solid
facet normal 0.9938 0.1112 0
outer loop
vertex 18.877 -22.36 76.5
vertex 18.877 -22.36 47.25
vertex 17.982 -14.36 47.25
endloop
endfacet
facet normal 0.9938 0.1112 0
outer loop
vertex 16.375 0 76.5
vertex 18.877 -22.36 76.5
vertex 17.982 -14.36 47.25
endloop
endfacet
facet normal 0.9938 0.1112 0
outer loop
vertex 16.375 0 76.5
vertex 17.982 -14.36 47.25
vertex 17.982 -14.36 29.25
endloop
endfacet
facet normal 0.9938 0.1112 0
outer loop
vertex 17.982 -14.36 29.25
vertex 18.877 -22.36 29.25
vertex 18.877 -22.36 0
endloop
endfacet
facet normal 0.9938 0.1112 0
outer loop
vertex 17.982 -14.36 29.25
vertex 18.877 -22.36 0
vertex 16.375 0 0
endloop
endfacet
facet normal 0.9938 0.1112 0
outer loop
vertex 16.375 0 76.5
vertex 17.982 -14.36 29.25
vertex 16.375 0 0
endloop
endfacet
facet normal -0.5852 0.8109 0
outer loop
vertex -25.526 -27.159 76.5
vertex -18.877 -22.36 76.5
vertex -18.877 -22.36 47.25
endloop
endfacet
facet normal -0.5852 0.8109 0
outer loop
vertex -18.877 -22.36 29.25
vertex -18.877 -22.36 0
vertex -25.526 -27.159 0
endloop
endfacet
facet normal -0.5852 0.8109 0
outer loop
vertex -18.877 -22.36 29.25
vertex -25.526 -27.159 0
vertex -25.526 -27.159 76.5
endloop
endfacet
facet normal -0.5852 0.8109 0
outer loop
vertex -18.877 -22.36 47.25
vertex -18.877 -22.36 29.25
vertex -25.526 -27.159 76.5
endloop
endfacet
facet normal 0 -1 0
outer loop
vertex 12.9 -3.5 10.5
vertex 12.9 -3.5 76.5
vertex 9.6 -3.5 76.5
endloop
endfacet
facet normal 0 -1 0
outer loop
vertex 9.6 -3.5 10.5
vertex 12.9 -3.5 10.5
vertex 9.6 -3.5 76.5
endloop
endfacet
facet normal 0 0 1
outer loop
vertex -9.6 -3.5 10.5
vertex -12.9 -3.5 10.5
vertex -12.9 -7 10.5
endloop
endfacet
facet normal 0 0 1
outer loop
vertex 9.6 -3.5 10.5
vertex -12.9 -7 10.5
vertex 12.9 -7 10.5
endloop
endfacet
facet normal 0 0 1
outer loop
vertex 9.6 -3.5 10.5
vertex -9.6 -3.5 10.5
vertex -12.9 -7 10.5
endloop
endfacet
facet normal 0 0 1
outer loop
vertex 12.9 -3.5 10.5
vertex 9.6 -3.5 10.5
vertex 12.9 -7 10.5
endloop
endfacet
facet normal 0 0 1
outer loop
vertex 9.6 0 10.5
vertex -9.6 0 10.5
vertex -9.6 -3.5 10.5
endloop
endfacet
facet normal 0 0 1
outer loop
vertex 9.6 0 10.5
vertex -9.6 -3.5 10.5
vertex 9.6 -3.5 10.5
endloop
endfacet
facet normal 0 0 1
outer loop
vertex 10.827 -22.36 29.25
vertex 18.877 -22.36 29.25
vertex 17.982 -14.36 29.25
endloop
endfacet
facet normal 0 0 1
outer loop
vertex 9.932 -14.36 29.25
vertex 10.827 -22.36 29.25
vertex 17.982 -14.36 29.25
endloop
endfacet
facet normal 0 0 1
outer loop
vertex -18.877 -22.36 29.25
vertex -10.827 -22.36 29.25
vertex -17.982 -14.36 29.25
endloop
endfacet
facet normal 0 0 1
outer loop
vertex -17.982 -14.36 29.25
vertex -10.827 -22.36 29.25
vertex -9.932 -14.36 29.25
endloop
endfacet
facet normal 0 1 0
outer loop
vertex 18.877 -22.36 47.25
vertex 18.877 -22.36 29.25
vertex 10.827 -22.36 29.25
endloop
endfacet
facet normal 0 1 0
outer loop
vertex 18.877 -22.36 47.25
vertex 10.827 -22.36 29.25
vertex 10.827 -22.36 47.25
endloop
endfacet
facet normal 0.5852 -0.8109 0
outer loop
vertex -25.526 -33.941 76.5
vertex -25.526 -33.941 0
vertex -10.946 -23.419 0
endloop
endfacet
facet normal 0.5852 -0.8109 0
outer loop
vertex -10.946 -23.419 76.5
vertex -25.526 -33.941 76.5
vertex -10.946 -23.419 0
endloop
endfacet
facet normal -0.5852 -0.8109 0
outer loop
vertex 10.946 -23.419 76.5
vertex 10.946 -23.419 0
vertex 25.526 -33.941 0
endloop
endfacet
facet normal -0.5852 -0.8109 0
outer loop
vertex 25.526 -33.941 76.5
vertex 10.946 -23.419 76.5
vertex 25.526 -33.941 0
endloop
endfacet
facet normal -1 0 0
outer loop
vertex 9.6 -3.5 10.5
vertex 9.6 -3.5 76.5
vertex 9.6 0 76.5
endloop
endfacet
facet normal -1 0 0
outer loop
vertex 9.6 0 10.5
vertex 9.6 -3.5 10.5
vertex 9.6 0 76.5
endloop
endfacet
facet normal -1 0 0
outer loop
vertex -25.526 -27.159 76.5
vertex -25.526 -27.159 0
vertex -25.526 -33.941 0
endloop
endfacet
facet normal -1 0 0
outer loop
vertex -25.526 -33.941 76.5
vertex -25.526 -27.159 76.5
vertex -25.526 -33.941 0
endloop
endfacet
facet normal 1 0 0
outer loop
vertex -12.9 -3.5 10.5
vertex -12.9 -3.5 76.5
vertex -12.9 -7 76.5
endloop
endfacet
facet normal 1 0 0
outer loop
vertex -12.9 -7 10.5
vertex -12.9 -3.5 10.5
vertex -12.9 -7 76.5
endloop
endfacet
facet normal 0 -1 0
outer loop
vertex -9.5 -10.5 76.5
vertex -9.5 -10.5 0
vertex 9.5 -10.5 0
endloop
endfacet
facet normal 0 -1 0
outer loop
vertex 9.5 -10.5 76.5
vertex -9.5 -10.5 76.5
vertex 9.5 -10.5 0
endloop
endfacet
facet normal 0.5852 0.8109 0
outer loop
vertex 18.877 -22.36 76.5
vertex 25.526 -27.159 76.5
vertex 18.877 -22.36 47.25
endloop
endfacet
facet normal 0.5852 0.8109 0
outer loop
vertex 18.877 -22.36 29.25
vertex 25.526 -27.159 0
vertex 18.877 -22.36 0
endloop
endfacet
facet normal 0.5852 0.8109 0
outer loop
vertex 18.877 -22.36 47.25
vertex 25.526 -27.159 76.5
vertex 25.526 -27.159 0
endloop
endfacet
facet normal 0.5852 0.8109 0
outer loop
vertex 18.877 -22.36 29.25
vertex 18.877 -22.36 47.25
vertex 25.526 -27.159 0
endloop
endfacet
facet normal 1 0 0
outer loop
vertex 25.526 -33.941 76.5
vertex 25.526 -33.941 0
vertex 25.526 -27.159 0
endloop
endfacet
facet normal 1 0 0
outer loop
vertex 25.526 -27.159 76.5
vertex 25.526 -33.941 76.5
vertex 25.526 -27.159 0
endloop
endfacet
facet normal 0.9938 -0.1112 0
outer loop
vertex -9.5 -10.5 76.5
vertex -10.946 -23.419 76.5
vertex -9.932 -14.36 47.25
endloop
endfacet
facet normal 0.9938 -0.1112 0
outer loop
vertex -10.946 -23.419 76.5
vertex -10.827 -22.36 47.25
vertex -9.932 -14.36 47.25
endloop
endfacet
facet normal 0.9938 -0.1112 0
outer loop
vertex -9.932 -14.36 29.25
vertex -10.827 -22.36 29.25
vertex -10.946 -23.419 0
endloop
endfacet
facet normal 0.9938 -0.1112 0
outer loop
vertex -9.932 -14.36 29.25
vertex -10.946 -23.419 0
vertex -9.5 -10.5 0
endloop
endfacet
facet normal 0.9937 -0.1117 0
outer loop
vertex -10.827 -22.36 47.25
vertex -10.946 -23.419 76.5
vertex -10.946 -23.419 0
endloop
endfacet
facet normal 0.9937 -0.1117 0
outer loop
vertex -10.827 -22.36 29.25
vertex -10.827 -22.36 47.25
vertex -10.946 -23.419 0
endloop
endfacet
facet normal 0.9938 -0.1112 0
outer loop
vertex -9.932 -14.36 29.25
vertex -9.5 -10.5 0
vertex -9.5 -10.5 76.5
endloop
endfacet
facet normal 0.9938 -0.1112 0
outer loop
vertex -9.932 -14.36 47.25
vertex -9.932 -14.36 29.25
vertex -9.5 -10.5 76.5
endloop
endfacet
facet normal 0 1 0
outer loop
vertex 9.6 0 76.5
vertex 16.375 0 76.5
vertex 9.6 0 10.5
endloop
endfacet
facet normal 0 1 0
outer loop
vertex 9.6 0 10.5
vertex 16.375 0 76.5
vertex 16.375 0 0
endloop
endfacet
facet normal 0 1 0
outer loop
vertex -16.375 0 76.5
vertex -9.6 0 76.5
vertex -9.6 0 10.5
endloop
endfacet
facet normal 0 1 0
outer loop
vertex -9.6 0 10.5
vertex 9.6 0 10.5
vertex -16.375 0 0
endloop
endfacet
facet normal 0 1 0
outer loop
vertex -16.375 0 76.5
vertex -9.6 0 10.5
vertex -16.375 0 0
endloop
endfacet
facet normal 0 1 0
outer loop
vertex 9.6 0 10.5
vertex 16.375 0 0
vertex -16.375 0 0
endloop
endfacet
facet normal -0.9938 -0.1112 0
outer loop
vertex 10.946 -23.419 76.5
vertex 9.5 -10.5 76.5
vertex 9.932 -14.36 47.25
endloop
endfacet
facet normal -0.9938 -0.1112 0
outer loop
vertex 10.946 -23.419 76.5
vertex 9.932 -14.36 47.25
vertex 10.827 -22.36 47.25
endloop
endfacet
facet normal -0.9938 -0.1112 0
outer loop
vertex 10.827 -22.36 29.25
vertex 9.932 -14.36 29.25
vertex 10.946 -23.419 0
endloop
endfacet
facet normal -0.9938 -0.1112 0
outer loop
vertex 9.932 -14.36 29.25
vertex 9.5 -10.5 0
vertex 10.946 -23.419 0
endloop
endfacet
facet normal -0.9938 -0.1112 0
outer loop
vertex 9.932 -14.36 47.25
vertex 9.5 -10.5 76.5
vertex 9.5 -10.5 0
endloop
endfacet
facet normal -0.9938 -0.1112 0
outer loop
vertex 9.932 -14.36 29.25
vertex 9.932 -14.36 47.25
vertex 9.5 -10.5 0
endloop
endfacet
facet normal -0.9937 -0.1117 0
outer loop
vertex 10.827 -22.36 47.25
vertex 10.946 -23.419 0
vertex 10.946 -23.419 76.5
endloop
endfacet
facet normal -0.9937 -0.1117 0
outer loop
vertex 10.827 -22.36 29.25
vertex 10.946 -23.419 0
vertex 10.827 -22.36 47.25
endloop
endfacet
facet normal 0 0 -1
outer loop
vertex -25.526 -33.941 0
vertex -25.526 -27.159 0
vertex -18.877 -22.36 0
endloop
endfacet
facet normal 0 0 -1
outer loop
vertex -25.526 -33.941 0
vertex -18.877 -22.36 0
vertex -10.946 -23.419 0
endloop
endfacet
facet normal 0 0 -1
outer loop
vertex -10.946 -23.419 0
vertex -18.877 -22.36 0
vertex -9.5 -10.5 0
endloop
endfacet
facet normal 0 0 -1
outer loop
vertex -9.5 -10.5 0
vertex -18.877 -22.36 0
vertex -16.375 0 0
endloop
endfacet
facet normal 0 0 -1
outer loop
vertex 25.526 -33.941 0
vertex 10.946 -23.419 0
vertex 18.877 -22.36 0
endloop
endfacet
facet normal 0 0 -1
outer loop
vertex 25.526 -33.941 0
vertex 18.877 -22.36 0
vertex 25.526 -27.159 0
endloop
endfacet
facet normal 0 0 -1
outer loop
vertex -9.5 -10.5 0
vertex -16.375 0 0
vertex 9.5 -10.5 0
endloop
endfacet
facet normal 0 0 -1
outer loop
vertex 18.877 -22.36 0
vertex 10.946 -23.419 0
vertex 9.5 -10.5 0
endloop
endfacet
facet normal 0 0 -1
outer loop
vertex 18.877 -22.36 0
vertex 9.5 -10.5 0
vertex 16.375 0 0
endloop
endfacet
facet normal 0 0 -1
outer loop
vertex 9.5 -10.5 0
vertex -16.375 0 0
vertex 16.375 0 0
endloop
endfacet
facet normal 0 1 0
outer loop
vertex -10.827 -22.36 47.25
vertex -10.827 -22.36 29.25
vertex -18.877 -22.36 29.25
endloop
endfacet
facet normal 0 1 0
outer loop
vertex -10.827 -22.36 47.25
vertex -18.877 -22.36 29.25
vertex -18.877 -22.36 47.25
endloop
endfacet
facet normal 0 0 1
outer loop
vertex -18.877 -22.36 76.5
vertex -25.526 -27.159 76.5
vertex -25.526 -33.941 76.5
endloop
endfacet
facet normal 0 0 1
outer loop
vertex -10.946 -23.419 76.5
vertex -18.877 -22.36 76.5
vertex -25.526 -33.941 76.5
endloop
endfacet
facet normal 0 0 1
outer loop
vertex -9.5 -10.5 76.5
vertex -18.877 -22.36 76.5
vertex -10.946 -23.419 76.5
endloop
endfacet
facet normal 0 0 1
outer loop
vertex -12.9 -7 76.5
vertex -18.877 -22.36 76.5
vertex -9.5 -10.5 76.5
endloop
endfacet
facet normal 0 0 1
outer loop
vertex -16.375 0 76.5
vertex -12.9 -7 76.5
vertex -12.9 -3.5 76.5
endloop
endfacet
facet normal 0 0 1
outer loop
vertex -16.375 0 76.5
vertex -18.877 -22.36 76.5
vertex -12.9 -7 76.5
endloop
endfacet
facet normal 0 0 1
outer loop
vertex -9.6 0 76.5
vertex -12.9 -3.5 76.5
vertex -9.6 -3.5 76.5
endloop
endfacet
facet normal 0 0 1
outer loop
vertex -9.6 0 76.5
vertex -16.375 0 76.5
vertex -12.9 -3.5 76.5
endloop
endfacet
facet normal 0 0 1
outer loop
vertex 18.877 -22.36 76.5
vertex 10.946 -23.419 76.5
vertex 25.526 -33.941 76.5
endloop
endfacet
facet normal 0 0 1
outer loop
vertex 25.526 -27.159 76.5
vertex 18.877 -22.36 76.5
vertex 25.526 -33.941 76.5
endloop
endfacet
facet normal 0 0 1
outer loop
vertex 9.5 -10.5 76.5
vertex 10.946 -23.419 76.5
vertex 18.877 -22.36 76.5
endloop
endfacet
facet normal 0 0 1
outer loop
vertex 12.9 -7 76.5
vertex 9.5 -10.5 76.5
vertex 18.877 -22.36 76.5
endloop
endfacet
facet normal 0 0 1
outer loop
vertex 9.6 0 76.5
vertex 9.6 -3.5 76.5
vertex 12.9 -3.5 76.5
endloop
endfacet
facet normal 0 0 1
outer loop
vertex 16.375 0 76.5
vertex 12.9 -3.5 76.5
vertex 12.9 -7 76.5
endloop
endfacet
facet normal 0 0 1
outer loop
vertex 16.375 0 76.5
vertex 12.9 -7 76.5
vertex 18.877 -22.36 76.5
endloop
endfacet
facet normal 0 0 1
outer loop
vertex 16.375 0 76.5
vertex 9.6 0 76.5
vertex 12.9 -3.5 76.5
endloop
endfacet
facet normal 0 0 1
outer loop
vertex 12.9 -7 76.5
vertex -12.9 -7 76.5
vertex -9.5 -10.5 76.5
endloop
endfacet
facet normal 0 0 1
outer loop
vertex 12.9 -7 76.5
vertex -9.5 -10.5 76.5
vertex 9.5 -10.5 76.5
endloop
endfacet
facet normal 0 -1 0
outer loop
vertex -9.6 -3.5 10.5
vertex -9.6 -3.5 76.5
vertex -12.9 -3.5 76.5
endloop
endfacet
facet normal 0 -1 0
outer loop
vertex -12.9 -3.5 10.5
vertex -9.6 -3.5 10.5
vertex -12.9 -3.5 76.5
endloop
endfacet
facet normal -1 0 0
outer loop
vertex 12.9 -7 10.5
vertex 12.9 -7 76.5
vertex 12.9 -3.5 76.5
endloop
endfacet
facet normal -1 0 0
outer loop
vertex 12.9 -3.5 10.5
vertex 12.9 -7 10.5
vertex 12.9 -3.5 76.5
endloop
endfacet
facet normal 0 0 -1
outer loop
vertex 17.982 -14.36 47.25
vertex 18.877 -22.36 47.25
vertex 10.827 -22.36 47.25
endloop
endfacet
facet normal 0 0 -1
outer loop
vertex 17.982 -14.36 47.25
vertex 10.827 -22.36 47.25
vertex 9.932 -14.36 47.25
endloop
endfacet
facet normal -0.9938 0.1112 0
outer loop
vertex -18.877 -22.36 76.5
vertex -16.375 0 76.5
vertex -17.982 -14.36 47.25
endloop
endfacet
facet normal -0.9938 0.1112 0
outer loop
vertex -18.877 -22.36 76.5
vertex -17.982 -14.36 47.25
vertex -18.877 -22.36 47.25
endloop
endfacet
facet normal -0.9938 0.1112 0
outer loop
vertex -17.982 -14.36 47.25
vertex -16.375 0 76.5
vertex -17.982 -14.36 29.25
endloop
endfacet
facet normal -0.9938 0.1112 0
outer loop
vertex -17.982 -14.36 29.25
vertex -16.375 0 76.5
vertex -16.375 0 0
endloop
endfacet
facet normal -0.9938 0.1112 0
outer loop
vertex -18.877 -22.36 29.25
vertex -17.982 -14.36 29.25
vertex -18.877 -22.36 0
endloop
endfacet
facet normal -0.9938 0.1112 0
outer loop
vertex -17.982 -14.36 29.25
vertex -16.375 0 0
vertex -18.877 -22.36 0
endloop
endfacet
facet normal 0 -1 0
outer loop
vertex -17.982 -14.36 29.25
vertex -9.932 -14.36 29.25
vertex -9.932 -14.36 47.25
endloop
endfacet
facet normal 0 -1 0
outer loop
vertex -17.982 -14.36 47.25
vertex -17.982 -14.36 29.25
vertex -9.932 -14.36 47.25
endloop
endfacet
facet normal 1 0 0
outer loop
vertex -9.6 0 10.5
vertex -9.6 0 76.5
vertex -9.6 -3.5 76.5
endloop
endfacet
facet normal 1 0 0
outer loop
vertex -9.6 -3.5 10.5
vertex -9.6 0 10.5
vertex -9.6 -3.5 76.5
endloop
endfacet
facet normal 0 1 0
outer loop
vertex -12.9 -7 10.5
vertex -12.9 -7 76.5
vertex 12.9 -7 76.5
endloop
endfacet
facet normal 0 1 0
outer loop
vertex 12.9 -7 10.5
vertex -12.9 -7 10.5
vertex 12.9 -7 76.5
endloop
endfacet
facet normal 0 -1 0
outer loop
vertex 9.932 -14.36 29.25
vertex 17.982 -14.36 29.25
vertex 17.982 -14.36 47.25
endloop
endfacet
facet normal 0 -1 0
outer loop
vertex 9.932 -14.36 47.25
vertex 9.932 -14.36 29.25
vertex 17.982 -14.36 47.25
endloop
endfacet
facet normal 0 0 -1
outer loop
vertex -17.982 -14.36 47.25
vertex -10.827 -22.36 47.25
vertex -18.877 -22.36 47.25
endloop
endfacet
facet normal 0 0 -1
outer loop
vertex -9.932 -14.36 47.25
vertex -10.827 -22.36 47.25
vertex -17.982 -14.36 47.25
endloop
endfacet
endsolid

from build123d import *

# Parameters (mm, degrees)
F1_DEPTH = 76.5
F3_DEPTH = 66
F5_W     = 8
F5_H     = 18
F6_DEPTH = 44.4045879922


with BuildPart() as f1:
    # F0 (on Top) → F1 (new body)
    with BuildSketch(Plane.XY):
        Polygon((18.8770888389, -22.3604461369), (16.375, 0), (0, 0), (-16.375, 0), (-18.8770888389, -22.3604461369), (-25.5264991533, -27.1589190681), (-25.5264991533, -33.9414753953), (-10.9456513292, -23.4193688791), (-9.5, -10.5), (0, -10.5), (9.5, -10.5), (10.9456513292, -23.4193688791), (25.5264991533, -33.9414753953), (25.5264991533, -27.1589190681), align=None)
    extrude(amount=F1_DEPTH)

    # F2 (on face) → F3 (cut)
    with BuildSketch(Plane.XY.offset(76.5)):
        Polygon((9.6, 0), (-9.6, 0), (-9.6, -3.5), (-12.9, -3.5), (-12.9, -7), (12.9, -7), (12.9, -3.5), (9.6, -3.5), align=None)
    extrude(amount=-F3_DEPTH, mode=Mode.SUBTRACT)

    # F5 (on plane+point) → F6 (cut, through all)
    with BuildSketch(Plane.YZ.offset(18.8770888389)):
        with Locations((-18.3604461369, 38.25)):
            Rectangle(F5_W, F5_H)
    extrude(amount=-F6_DEPTH, mode=Mode.SUBTRACT)


solid = f1.part
